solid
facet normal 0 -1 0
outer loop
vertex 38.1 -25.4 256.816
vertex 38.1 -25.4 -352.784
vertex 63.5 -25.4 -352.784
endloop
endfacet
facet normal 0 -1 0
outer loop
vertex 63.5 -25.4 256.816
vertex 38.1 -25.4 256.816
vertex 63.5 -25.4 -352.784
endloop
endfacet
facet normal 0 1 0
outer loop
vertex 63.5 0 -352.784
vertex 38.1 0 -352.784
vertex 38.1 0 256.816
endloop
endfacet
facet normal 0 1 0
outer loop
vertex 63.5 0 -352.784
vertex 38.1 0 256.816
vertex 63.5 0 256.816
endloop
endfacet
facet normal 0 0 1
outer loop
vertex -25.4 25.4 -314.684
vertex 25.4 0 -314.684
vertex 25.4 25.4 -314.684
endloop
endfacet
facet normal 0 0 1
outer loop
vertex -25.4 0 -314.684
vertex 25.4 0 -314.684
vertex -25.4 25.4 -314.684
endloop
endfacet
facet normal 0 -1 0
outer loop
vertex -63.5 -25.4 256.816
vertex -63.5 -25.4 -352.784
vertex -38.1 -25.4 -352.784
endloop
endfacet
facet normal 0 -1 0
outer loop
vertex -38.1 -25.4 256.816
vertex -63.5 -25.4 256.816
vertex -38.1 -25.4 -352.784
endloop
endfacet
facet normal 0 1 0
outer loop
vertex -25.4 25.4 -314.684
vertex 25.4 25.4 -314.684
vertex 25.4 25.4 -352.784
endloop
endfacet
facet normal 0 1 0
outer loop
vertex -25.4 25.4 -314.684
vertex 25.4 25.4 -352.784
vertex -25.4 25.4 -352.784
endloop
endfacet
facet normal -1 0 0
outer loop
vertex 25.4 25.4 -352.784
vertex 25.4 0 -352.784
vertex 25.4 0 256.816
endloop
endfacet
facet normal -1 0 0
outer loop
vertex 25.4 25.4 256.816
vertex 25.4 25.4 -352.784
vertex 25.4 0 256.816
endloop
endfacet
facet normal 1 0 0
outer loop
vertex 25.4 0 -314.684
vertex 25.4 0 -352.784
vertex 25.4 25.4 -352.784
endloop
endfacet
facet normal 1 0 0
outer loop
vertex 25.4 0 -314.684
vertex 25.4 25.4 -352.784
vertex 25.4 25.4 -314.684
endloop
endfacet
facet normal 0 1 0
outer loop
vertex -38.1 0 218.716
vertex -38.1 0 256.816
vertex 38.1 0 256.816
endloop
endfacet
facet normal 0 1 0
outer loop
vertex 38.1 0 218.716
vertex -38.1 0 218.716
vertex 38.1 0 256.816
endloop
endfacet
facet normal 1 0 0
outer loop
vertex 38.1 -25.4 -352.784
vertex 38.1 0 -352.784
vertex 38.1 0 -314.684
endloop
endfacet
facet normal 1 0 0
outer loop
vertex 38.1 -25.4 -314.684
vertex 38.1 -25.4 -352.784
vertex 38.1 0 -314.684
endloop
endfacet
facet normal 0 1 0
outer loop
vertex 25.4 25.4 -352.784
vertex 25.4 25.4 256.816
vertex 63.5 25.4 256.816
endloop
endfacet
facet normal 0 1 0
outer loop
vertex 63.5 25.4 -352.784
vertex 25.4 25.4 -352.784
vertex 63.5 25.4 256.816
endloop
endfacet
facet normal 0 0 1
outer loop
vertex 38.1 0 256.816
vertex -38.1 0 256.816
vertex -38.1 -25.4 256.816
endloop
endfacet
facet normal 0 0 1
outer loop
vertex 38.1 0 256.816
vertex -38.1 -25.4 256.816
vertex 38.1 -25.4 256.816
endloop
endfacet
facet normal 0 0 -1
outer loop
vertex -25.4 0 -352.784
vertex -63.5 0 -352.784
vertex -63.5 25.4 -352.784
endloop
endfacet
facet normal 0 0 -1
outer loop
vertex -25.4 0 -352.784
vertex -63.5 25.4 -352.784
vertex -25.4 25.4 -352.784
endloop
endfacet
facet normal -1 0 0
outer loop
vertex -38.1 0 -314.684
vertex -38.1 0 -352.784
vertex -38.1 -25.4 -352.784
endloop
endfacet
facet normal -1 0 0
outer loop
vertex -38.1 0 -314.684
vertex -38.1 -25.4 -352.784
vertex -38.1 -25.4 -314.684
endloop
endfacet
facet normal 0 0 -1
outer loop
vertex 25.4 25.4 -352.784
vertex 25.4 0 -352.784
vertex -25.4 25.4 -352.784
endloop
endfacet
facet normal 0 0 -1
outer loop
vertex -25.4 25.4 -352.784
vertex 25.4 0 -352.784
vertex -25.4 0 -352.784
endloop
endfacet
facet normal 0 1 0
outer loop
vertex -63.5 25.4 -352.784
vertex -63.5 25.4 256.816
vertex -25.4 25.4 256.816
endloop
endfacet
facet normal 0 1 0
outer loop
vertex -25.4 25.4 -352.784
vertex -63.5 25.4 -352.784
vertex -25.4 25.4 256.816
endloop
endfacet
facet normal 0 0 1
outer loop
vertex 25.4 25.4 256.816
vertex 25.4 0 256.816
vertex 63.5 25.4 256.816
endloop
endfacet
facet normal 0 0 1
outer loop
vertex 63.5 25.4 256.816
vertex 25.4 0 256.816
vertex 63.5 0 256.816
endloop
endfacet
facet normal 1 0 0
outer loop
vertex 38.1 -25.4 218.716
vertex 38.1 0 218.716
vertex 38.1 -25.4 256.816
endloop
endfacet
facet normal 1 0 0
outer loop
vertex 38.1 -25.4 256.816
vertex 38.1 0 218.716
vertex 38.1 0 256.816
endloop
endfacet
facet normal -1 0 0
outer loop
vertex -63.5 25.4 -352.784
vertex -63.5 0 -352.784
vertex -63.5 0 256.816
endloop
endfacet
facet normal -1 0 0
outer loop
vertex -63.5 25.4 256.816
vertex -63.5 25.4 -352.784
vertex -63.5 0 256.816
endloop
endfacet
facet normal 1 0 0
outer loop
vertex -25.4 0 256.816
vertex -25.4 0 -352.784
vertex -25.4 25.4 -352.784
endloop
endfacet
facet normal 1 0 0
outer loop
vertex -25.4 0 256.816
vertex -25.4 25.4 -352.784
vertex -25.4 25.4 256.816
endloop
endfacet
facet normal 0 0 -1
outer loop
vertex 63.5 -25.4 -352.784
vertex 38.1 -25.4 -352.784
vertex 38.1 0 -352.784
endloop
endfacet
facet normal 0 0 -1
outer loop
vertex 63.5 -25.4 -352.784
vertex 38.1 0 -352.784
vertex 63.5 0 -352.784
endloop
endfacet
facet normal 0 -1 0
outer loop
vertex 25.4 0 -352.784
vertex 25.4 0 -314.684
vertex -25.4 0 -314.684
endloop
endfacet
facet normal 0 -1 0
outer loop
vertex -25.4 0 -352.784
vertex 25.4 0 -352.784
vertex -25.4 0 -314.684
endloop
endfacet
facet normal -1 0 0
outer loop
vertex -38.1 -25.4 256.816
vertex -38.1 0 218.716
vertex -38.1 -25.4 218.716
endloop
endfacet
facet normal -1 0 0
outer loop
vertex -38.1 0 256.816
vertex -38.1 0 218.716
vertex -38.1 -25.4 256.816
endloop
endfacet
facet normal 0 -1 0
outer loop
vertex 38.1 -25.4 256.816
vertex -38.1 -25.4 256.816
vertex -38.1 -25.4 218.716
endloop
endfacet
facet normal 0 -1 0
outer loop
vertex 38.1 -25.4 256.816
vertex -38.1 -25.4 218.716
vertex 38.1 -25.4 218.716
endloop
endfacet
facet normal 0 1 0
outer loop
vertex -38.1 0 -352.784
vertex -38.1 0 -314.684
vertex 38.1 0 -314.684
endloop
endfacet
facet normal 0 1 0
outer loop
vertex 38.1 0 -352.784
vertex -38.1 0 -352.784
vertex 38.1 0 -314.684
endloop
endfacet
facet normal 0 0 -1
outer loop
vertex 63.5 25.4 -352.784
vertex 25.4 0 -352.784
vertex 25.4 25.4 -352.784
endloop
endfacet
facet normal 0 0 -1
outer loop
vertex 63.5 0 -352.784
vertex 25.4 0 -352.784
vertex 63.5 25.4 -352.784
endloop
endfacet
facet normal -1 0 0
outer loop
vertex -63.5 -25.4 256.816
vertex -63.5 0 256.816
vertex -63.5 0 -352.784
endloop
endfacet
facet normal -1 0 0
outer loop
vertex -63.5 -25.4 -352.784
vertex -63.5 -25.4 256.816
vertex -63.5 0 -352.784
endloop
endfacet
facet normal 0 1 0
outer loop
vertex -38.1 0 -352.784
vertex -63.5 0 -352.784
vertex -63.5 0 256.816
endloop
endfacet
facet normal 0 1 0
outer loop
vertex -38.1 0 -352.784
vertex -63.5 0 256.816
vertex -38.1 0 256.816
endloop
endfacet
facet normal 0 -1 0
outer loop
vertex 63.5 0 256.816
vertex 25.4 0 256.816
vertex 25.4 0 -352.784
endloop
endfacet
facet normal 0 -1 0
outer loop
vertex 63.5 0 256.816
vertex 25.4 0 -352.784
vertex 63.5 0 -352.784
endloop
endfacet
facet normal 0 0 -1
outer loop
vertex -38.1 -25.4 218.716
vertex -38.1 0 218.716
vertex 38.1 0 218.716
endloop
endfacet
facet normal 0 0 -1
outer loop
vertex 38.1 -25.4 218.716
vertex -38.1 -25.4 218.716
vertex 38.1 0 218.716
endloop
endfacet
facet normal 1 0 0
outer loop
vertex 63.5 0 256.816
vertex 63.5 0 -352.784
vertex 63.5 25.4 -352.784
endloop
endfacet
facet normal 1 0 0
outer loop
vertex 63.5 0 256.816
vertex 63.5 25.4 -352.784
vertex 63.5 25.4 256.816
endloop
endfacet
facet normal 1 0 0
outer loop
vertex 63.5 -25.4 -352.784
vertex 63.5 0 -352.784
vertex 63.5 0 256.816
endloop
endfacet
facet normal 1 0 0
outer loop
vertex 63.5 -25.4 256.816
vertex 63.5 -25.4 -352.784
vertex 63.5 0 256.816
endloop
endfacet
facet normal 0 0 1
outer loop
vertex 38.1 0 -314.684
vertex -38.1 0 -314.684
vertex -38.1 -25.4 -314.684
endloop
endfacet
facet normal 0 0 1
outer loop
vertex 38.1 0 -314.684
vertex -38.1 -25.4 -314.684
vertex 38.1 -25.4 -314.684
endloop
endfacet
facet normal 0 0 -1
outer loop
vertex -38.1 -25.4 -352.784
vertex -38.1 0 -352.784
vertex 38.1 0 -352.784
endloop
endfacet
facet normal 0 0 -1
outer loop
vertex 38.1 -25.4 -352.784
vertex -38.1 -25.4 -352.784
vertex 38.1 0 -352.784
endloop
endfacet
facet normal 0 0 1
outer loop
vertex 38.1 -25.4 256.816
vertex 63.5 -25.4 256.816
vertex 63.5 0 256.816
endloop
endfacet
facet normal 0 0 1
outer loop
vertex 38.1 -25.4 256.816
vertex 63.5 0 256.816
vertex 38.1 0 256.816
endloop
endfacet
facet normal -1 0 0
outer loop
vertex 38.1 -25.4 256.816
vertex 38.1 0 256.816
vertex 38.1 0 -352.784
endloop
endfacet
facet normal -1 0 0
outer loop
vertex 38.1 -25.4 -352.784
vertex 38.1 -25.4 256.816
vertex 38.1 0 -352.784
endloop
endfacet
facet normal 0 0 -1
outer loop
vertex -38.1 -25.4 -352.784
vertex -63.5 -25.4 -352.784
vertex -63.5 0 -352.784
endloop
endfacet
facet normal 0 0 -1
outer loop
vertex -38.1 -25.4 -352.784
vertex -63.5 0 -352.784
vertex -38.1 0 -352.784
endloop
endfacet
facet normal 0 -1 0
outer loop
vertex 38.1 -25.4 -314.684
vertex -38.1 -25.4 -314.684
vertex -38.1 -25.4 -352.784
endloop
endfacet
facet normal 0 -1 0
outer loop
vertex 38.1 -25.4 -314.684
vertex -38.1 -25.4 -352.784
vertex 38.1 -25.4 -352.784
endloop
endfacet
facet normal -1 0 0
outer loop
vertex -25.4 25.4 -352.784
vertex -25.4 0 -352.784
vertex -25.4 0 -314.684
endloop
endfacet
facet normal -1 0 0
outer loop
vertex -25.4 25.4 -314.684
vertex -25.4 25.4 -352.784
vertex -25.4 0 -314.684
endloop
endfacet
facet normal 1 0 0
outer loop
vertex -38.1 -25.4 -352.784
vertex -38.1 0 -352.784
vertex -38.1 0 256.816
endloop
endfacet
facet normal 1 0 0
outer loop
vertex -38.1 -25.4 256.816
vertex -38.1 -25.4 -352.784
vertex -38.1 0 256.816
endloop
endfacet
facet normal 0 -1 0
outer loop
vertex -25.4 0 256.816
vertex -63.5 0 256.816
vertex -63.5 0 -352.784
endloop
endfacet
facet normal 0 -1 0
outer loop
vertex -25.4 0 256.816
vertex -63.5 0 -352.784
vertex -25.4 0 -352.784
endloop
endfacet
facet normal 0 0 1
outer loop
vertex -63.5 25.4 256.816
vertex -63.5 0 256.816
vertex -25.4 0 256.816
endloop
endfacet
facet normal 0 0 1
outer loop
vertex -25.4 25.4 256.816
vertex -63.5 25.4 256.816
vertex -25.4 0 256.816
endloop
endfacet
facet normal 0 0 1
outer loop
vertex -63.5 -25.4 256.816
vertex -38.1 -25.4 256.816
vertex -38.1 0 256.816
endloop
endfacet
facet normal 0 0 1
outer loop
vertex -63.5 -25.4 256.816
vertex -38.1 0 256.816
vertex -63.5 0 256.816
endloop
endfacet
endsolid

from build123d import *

# Parameters (mm, degrees)
F0_W     = 38.1
F0_H     = 609.6
F1_DEPTH = 25.4
F3_DEPTH = 25.4
F2_W     = 76.2
F2_H     = 38.1
F4_DEPTH = 25.4
F5_W     = 50.8
F5_H     = 38.1
F6_DEPTH = 25.4


with BuildPart() as f1:
    # F0 (on Front) → F1 (new body)
    with BuildSketch(Plane.XZ):
        with Locations((44.45, -47.983626)):
            Rectangle(F0_W, F0_H)
        with Locations((-44.45, -47.983626)):
            Rectangle(F0_W, F0_H)
    extrude(amount=-F1_DEPTH)


with BuildPart() as f3:
    # F2 (on Front) → F3 (new body)
    with BuildSketch(Plane.XZ):
        Polygon((-38.1, 256.816374), (-63.5, 256.816374), (-63.5, -352.783626), (-38.1, -352.783626), (-38.1, -314.683626), (-38.1, 218.716374), align=None)
        Polygon((63.5, 256.816374), (38.1, 256.816374), (38.1, 218.716374), (38.1, -314.683626), (38.1, -352.783626), (63.5, -352.783626), align=None)
    extrude(amount=F3_DEPTH)


with BuildPart() as f4:
    # F2 (on Front) → F4 (new body)
    with BuildSketch(Plane.XZ):
        with Locations((0, 237.766374)):
            Rectangle(F2_W, F2_H)
        with Locations((0, -333.733626)):
            Rectangle(F2_W, F2_H)
    extrude(amount=F4_DEPTH)


with BuildPart() as f6:
    # F5 (on face) → F6 (new body)
    with BuildSketch(Plane(origin=(0, 0, 0), x_dir=(-1, 0, 0), z_dir=(0, 1, 0))):
        with Locations((0, -333.733626)):
            Rectangle(F5_W, F5_H)
    extrude(amount=F6_DEPTH)


solid = Compound([f1.part, f3.part, f4.part, f6.part])
